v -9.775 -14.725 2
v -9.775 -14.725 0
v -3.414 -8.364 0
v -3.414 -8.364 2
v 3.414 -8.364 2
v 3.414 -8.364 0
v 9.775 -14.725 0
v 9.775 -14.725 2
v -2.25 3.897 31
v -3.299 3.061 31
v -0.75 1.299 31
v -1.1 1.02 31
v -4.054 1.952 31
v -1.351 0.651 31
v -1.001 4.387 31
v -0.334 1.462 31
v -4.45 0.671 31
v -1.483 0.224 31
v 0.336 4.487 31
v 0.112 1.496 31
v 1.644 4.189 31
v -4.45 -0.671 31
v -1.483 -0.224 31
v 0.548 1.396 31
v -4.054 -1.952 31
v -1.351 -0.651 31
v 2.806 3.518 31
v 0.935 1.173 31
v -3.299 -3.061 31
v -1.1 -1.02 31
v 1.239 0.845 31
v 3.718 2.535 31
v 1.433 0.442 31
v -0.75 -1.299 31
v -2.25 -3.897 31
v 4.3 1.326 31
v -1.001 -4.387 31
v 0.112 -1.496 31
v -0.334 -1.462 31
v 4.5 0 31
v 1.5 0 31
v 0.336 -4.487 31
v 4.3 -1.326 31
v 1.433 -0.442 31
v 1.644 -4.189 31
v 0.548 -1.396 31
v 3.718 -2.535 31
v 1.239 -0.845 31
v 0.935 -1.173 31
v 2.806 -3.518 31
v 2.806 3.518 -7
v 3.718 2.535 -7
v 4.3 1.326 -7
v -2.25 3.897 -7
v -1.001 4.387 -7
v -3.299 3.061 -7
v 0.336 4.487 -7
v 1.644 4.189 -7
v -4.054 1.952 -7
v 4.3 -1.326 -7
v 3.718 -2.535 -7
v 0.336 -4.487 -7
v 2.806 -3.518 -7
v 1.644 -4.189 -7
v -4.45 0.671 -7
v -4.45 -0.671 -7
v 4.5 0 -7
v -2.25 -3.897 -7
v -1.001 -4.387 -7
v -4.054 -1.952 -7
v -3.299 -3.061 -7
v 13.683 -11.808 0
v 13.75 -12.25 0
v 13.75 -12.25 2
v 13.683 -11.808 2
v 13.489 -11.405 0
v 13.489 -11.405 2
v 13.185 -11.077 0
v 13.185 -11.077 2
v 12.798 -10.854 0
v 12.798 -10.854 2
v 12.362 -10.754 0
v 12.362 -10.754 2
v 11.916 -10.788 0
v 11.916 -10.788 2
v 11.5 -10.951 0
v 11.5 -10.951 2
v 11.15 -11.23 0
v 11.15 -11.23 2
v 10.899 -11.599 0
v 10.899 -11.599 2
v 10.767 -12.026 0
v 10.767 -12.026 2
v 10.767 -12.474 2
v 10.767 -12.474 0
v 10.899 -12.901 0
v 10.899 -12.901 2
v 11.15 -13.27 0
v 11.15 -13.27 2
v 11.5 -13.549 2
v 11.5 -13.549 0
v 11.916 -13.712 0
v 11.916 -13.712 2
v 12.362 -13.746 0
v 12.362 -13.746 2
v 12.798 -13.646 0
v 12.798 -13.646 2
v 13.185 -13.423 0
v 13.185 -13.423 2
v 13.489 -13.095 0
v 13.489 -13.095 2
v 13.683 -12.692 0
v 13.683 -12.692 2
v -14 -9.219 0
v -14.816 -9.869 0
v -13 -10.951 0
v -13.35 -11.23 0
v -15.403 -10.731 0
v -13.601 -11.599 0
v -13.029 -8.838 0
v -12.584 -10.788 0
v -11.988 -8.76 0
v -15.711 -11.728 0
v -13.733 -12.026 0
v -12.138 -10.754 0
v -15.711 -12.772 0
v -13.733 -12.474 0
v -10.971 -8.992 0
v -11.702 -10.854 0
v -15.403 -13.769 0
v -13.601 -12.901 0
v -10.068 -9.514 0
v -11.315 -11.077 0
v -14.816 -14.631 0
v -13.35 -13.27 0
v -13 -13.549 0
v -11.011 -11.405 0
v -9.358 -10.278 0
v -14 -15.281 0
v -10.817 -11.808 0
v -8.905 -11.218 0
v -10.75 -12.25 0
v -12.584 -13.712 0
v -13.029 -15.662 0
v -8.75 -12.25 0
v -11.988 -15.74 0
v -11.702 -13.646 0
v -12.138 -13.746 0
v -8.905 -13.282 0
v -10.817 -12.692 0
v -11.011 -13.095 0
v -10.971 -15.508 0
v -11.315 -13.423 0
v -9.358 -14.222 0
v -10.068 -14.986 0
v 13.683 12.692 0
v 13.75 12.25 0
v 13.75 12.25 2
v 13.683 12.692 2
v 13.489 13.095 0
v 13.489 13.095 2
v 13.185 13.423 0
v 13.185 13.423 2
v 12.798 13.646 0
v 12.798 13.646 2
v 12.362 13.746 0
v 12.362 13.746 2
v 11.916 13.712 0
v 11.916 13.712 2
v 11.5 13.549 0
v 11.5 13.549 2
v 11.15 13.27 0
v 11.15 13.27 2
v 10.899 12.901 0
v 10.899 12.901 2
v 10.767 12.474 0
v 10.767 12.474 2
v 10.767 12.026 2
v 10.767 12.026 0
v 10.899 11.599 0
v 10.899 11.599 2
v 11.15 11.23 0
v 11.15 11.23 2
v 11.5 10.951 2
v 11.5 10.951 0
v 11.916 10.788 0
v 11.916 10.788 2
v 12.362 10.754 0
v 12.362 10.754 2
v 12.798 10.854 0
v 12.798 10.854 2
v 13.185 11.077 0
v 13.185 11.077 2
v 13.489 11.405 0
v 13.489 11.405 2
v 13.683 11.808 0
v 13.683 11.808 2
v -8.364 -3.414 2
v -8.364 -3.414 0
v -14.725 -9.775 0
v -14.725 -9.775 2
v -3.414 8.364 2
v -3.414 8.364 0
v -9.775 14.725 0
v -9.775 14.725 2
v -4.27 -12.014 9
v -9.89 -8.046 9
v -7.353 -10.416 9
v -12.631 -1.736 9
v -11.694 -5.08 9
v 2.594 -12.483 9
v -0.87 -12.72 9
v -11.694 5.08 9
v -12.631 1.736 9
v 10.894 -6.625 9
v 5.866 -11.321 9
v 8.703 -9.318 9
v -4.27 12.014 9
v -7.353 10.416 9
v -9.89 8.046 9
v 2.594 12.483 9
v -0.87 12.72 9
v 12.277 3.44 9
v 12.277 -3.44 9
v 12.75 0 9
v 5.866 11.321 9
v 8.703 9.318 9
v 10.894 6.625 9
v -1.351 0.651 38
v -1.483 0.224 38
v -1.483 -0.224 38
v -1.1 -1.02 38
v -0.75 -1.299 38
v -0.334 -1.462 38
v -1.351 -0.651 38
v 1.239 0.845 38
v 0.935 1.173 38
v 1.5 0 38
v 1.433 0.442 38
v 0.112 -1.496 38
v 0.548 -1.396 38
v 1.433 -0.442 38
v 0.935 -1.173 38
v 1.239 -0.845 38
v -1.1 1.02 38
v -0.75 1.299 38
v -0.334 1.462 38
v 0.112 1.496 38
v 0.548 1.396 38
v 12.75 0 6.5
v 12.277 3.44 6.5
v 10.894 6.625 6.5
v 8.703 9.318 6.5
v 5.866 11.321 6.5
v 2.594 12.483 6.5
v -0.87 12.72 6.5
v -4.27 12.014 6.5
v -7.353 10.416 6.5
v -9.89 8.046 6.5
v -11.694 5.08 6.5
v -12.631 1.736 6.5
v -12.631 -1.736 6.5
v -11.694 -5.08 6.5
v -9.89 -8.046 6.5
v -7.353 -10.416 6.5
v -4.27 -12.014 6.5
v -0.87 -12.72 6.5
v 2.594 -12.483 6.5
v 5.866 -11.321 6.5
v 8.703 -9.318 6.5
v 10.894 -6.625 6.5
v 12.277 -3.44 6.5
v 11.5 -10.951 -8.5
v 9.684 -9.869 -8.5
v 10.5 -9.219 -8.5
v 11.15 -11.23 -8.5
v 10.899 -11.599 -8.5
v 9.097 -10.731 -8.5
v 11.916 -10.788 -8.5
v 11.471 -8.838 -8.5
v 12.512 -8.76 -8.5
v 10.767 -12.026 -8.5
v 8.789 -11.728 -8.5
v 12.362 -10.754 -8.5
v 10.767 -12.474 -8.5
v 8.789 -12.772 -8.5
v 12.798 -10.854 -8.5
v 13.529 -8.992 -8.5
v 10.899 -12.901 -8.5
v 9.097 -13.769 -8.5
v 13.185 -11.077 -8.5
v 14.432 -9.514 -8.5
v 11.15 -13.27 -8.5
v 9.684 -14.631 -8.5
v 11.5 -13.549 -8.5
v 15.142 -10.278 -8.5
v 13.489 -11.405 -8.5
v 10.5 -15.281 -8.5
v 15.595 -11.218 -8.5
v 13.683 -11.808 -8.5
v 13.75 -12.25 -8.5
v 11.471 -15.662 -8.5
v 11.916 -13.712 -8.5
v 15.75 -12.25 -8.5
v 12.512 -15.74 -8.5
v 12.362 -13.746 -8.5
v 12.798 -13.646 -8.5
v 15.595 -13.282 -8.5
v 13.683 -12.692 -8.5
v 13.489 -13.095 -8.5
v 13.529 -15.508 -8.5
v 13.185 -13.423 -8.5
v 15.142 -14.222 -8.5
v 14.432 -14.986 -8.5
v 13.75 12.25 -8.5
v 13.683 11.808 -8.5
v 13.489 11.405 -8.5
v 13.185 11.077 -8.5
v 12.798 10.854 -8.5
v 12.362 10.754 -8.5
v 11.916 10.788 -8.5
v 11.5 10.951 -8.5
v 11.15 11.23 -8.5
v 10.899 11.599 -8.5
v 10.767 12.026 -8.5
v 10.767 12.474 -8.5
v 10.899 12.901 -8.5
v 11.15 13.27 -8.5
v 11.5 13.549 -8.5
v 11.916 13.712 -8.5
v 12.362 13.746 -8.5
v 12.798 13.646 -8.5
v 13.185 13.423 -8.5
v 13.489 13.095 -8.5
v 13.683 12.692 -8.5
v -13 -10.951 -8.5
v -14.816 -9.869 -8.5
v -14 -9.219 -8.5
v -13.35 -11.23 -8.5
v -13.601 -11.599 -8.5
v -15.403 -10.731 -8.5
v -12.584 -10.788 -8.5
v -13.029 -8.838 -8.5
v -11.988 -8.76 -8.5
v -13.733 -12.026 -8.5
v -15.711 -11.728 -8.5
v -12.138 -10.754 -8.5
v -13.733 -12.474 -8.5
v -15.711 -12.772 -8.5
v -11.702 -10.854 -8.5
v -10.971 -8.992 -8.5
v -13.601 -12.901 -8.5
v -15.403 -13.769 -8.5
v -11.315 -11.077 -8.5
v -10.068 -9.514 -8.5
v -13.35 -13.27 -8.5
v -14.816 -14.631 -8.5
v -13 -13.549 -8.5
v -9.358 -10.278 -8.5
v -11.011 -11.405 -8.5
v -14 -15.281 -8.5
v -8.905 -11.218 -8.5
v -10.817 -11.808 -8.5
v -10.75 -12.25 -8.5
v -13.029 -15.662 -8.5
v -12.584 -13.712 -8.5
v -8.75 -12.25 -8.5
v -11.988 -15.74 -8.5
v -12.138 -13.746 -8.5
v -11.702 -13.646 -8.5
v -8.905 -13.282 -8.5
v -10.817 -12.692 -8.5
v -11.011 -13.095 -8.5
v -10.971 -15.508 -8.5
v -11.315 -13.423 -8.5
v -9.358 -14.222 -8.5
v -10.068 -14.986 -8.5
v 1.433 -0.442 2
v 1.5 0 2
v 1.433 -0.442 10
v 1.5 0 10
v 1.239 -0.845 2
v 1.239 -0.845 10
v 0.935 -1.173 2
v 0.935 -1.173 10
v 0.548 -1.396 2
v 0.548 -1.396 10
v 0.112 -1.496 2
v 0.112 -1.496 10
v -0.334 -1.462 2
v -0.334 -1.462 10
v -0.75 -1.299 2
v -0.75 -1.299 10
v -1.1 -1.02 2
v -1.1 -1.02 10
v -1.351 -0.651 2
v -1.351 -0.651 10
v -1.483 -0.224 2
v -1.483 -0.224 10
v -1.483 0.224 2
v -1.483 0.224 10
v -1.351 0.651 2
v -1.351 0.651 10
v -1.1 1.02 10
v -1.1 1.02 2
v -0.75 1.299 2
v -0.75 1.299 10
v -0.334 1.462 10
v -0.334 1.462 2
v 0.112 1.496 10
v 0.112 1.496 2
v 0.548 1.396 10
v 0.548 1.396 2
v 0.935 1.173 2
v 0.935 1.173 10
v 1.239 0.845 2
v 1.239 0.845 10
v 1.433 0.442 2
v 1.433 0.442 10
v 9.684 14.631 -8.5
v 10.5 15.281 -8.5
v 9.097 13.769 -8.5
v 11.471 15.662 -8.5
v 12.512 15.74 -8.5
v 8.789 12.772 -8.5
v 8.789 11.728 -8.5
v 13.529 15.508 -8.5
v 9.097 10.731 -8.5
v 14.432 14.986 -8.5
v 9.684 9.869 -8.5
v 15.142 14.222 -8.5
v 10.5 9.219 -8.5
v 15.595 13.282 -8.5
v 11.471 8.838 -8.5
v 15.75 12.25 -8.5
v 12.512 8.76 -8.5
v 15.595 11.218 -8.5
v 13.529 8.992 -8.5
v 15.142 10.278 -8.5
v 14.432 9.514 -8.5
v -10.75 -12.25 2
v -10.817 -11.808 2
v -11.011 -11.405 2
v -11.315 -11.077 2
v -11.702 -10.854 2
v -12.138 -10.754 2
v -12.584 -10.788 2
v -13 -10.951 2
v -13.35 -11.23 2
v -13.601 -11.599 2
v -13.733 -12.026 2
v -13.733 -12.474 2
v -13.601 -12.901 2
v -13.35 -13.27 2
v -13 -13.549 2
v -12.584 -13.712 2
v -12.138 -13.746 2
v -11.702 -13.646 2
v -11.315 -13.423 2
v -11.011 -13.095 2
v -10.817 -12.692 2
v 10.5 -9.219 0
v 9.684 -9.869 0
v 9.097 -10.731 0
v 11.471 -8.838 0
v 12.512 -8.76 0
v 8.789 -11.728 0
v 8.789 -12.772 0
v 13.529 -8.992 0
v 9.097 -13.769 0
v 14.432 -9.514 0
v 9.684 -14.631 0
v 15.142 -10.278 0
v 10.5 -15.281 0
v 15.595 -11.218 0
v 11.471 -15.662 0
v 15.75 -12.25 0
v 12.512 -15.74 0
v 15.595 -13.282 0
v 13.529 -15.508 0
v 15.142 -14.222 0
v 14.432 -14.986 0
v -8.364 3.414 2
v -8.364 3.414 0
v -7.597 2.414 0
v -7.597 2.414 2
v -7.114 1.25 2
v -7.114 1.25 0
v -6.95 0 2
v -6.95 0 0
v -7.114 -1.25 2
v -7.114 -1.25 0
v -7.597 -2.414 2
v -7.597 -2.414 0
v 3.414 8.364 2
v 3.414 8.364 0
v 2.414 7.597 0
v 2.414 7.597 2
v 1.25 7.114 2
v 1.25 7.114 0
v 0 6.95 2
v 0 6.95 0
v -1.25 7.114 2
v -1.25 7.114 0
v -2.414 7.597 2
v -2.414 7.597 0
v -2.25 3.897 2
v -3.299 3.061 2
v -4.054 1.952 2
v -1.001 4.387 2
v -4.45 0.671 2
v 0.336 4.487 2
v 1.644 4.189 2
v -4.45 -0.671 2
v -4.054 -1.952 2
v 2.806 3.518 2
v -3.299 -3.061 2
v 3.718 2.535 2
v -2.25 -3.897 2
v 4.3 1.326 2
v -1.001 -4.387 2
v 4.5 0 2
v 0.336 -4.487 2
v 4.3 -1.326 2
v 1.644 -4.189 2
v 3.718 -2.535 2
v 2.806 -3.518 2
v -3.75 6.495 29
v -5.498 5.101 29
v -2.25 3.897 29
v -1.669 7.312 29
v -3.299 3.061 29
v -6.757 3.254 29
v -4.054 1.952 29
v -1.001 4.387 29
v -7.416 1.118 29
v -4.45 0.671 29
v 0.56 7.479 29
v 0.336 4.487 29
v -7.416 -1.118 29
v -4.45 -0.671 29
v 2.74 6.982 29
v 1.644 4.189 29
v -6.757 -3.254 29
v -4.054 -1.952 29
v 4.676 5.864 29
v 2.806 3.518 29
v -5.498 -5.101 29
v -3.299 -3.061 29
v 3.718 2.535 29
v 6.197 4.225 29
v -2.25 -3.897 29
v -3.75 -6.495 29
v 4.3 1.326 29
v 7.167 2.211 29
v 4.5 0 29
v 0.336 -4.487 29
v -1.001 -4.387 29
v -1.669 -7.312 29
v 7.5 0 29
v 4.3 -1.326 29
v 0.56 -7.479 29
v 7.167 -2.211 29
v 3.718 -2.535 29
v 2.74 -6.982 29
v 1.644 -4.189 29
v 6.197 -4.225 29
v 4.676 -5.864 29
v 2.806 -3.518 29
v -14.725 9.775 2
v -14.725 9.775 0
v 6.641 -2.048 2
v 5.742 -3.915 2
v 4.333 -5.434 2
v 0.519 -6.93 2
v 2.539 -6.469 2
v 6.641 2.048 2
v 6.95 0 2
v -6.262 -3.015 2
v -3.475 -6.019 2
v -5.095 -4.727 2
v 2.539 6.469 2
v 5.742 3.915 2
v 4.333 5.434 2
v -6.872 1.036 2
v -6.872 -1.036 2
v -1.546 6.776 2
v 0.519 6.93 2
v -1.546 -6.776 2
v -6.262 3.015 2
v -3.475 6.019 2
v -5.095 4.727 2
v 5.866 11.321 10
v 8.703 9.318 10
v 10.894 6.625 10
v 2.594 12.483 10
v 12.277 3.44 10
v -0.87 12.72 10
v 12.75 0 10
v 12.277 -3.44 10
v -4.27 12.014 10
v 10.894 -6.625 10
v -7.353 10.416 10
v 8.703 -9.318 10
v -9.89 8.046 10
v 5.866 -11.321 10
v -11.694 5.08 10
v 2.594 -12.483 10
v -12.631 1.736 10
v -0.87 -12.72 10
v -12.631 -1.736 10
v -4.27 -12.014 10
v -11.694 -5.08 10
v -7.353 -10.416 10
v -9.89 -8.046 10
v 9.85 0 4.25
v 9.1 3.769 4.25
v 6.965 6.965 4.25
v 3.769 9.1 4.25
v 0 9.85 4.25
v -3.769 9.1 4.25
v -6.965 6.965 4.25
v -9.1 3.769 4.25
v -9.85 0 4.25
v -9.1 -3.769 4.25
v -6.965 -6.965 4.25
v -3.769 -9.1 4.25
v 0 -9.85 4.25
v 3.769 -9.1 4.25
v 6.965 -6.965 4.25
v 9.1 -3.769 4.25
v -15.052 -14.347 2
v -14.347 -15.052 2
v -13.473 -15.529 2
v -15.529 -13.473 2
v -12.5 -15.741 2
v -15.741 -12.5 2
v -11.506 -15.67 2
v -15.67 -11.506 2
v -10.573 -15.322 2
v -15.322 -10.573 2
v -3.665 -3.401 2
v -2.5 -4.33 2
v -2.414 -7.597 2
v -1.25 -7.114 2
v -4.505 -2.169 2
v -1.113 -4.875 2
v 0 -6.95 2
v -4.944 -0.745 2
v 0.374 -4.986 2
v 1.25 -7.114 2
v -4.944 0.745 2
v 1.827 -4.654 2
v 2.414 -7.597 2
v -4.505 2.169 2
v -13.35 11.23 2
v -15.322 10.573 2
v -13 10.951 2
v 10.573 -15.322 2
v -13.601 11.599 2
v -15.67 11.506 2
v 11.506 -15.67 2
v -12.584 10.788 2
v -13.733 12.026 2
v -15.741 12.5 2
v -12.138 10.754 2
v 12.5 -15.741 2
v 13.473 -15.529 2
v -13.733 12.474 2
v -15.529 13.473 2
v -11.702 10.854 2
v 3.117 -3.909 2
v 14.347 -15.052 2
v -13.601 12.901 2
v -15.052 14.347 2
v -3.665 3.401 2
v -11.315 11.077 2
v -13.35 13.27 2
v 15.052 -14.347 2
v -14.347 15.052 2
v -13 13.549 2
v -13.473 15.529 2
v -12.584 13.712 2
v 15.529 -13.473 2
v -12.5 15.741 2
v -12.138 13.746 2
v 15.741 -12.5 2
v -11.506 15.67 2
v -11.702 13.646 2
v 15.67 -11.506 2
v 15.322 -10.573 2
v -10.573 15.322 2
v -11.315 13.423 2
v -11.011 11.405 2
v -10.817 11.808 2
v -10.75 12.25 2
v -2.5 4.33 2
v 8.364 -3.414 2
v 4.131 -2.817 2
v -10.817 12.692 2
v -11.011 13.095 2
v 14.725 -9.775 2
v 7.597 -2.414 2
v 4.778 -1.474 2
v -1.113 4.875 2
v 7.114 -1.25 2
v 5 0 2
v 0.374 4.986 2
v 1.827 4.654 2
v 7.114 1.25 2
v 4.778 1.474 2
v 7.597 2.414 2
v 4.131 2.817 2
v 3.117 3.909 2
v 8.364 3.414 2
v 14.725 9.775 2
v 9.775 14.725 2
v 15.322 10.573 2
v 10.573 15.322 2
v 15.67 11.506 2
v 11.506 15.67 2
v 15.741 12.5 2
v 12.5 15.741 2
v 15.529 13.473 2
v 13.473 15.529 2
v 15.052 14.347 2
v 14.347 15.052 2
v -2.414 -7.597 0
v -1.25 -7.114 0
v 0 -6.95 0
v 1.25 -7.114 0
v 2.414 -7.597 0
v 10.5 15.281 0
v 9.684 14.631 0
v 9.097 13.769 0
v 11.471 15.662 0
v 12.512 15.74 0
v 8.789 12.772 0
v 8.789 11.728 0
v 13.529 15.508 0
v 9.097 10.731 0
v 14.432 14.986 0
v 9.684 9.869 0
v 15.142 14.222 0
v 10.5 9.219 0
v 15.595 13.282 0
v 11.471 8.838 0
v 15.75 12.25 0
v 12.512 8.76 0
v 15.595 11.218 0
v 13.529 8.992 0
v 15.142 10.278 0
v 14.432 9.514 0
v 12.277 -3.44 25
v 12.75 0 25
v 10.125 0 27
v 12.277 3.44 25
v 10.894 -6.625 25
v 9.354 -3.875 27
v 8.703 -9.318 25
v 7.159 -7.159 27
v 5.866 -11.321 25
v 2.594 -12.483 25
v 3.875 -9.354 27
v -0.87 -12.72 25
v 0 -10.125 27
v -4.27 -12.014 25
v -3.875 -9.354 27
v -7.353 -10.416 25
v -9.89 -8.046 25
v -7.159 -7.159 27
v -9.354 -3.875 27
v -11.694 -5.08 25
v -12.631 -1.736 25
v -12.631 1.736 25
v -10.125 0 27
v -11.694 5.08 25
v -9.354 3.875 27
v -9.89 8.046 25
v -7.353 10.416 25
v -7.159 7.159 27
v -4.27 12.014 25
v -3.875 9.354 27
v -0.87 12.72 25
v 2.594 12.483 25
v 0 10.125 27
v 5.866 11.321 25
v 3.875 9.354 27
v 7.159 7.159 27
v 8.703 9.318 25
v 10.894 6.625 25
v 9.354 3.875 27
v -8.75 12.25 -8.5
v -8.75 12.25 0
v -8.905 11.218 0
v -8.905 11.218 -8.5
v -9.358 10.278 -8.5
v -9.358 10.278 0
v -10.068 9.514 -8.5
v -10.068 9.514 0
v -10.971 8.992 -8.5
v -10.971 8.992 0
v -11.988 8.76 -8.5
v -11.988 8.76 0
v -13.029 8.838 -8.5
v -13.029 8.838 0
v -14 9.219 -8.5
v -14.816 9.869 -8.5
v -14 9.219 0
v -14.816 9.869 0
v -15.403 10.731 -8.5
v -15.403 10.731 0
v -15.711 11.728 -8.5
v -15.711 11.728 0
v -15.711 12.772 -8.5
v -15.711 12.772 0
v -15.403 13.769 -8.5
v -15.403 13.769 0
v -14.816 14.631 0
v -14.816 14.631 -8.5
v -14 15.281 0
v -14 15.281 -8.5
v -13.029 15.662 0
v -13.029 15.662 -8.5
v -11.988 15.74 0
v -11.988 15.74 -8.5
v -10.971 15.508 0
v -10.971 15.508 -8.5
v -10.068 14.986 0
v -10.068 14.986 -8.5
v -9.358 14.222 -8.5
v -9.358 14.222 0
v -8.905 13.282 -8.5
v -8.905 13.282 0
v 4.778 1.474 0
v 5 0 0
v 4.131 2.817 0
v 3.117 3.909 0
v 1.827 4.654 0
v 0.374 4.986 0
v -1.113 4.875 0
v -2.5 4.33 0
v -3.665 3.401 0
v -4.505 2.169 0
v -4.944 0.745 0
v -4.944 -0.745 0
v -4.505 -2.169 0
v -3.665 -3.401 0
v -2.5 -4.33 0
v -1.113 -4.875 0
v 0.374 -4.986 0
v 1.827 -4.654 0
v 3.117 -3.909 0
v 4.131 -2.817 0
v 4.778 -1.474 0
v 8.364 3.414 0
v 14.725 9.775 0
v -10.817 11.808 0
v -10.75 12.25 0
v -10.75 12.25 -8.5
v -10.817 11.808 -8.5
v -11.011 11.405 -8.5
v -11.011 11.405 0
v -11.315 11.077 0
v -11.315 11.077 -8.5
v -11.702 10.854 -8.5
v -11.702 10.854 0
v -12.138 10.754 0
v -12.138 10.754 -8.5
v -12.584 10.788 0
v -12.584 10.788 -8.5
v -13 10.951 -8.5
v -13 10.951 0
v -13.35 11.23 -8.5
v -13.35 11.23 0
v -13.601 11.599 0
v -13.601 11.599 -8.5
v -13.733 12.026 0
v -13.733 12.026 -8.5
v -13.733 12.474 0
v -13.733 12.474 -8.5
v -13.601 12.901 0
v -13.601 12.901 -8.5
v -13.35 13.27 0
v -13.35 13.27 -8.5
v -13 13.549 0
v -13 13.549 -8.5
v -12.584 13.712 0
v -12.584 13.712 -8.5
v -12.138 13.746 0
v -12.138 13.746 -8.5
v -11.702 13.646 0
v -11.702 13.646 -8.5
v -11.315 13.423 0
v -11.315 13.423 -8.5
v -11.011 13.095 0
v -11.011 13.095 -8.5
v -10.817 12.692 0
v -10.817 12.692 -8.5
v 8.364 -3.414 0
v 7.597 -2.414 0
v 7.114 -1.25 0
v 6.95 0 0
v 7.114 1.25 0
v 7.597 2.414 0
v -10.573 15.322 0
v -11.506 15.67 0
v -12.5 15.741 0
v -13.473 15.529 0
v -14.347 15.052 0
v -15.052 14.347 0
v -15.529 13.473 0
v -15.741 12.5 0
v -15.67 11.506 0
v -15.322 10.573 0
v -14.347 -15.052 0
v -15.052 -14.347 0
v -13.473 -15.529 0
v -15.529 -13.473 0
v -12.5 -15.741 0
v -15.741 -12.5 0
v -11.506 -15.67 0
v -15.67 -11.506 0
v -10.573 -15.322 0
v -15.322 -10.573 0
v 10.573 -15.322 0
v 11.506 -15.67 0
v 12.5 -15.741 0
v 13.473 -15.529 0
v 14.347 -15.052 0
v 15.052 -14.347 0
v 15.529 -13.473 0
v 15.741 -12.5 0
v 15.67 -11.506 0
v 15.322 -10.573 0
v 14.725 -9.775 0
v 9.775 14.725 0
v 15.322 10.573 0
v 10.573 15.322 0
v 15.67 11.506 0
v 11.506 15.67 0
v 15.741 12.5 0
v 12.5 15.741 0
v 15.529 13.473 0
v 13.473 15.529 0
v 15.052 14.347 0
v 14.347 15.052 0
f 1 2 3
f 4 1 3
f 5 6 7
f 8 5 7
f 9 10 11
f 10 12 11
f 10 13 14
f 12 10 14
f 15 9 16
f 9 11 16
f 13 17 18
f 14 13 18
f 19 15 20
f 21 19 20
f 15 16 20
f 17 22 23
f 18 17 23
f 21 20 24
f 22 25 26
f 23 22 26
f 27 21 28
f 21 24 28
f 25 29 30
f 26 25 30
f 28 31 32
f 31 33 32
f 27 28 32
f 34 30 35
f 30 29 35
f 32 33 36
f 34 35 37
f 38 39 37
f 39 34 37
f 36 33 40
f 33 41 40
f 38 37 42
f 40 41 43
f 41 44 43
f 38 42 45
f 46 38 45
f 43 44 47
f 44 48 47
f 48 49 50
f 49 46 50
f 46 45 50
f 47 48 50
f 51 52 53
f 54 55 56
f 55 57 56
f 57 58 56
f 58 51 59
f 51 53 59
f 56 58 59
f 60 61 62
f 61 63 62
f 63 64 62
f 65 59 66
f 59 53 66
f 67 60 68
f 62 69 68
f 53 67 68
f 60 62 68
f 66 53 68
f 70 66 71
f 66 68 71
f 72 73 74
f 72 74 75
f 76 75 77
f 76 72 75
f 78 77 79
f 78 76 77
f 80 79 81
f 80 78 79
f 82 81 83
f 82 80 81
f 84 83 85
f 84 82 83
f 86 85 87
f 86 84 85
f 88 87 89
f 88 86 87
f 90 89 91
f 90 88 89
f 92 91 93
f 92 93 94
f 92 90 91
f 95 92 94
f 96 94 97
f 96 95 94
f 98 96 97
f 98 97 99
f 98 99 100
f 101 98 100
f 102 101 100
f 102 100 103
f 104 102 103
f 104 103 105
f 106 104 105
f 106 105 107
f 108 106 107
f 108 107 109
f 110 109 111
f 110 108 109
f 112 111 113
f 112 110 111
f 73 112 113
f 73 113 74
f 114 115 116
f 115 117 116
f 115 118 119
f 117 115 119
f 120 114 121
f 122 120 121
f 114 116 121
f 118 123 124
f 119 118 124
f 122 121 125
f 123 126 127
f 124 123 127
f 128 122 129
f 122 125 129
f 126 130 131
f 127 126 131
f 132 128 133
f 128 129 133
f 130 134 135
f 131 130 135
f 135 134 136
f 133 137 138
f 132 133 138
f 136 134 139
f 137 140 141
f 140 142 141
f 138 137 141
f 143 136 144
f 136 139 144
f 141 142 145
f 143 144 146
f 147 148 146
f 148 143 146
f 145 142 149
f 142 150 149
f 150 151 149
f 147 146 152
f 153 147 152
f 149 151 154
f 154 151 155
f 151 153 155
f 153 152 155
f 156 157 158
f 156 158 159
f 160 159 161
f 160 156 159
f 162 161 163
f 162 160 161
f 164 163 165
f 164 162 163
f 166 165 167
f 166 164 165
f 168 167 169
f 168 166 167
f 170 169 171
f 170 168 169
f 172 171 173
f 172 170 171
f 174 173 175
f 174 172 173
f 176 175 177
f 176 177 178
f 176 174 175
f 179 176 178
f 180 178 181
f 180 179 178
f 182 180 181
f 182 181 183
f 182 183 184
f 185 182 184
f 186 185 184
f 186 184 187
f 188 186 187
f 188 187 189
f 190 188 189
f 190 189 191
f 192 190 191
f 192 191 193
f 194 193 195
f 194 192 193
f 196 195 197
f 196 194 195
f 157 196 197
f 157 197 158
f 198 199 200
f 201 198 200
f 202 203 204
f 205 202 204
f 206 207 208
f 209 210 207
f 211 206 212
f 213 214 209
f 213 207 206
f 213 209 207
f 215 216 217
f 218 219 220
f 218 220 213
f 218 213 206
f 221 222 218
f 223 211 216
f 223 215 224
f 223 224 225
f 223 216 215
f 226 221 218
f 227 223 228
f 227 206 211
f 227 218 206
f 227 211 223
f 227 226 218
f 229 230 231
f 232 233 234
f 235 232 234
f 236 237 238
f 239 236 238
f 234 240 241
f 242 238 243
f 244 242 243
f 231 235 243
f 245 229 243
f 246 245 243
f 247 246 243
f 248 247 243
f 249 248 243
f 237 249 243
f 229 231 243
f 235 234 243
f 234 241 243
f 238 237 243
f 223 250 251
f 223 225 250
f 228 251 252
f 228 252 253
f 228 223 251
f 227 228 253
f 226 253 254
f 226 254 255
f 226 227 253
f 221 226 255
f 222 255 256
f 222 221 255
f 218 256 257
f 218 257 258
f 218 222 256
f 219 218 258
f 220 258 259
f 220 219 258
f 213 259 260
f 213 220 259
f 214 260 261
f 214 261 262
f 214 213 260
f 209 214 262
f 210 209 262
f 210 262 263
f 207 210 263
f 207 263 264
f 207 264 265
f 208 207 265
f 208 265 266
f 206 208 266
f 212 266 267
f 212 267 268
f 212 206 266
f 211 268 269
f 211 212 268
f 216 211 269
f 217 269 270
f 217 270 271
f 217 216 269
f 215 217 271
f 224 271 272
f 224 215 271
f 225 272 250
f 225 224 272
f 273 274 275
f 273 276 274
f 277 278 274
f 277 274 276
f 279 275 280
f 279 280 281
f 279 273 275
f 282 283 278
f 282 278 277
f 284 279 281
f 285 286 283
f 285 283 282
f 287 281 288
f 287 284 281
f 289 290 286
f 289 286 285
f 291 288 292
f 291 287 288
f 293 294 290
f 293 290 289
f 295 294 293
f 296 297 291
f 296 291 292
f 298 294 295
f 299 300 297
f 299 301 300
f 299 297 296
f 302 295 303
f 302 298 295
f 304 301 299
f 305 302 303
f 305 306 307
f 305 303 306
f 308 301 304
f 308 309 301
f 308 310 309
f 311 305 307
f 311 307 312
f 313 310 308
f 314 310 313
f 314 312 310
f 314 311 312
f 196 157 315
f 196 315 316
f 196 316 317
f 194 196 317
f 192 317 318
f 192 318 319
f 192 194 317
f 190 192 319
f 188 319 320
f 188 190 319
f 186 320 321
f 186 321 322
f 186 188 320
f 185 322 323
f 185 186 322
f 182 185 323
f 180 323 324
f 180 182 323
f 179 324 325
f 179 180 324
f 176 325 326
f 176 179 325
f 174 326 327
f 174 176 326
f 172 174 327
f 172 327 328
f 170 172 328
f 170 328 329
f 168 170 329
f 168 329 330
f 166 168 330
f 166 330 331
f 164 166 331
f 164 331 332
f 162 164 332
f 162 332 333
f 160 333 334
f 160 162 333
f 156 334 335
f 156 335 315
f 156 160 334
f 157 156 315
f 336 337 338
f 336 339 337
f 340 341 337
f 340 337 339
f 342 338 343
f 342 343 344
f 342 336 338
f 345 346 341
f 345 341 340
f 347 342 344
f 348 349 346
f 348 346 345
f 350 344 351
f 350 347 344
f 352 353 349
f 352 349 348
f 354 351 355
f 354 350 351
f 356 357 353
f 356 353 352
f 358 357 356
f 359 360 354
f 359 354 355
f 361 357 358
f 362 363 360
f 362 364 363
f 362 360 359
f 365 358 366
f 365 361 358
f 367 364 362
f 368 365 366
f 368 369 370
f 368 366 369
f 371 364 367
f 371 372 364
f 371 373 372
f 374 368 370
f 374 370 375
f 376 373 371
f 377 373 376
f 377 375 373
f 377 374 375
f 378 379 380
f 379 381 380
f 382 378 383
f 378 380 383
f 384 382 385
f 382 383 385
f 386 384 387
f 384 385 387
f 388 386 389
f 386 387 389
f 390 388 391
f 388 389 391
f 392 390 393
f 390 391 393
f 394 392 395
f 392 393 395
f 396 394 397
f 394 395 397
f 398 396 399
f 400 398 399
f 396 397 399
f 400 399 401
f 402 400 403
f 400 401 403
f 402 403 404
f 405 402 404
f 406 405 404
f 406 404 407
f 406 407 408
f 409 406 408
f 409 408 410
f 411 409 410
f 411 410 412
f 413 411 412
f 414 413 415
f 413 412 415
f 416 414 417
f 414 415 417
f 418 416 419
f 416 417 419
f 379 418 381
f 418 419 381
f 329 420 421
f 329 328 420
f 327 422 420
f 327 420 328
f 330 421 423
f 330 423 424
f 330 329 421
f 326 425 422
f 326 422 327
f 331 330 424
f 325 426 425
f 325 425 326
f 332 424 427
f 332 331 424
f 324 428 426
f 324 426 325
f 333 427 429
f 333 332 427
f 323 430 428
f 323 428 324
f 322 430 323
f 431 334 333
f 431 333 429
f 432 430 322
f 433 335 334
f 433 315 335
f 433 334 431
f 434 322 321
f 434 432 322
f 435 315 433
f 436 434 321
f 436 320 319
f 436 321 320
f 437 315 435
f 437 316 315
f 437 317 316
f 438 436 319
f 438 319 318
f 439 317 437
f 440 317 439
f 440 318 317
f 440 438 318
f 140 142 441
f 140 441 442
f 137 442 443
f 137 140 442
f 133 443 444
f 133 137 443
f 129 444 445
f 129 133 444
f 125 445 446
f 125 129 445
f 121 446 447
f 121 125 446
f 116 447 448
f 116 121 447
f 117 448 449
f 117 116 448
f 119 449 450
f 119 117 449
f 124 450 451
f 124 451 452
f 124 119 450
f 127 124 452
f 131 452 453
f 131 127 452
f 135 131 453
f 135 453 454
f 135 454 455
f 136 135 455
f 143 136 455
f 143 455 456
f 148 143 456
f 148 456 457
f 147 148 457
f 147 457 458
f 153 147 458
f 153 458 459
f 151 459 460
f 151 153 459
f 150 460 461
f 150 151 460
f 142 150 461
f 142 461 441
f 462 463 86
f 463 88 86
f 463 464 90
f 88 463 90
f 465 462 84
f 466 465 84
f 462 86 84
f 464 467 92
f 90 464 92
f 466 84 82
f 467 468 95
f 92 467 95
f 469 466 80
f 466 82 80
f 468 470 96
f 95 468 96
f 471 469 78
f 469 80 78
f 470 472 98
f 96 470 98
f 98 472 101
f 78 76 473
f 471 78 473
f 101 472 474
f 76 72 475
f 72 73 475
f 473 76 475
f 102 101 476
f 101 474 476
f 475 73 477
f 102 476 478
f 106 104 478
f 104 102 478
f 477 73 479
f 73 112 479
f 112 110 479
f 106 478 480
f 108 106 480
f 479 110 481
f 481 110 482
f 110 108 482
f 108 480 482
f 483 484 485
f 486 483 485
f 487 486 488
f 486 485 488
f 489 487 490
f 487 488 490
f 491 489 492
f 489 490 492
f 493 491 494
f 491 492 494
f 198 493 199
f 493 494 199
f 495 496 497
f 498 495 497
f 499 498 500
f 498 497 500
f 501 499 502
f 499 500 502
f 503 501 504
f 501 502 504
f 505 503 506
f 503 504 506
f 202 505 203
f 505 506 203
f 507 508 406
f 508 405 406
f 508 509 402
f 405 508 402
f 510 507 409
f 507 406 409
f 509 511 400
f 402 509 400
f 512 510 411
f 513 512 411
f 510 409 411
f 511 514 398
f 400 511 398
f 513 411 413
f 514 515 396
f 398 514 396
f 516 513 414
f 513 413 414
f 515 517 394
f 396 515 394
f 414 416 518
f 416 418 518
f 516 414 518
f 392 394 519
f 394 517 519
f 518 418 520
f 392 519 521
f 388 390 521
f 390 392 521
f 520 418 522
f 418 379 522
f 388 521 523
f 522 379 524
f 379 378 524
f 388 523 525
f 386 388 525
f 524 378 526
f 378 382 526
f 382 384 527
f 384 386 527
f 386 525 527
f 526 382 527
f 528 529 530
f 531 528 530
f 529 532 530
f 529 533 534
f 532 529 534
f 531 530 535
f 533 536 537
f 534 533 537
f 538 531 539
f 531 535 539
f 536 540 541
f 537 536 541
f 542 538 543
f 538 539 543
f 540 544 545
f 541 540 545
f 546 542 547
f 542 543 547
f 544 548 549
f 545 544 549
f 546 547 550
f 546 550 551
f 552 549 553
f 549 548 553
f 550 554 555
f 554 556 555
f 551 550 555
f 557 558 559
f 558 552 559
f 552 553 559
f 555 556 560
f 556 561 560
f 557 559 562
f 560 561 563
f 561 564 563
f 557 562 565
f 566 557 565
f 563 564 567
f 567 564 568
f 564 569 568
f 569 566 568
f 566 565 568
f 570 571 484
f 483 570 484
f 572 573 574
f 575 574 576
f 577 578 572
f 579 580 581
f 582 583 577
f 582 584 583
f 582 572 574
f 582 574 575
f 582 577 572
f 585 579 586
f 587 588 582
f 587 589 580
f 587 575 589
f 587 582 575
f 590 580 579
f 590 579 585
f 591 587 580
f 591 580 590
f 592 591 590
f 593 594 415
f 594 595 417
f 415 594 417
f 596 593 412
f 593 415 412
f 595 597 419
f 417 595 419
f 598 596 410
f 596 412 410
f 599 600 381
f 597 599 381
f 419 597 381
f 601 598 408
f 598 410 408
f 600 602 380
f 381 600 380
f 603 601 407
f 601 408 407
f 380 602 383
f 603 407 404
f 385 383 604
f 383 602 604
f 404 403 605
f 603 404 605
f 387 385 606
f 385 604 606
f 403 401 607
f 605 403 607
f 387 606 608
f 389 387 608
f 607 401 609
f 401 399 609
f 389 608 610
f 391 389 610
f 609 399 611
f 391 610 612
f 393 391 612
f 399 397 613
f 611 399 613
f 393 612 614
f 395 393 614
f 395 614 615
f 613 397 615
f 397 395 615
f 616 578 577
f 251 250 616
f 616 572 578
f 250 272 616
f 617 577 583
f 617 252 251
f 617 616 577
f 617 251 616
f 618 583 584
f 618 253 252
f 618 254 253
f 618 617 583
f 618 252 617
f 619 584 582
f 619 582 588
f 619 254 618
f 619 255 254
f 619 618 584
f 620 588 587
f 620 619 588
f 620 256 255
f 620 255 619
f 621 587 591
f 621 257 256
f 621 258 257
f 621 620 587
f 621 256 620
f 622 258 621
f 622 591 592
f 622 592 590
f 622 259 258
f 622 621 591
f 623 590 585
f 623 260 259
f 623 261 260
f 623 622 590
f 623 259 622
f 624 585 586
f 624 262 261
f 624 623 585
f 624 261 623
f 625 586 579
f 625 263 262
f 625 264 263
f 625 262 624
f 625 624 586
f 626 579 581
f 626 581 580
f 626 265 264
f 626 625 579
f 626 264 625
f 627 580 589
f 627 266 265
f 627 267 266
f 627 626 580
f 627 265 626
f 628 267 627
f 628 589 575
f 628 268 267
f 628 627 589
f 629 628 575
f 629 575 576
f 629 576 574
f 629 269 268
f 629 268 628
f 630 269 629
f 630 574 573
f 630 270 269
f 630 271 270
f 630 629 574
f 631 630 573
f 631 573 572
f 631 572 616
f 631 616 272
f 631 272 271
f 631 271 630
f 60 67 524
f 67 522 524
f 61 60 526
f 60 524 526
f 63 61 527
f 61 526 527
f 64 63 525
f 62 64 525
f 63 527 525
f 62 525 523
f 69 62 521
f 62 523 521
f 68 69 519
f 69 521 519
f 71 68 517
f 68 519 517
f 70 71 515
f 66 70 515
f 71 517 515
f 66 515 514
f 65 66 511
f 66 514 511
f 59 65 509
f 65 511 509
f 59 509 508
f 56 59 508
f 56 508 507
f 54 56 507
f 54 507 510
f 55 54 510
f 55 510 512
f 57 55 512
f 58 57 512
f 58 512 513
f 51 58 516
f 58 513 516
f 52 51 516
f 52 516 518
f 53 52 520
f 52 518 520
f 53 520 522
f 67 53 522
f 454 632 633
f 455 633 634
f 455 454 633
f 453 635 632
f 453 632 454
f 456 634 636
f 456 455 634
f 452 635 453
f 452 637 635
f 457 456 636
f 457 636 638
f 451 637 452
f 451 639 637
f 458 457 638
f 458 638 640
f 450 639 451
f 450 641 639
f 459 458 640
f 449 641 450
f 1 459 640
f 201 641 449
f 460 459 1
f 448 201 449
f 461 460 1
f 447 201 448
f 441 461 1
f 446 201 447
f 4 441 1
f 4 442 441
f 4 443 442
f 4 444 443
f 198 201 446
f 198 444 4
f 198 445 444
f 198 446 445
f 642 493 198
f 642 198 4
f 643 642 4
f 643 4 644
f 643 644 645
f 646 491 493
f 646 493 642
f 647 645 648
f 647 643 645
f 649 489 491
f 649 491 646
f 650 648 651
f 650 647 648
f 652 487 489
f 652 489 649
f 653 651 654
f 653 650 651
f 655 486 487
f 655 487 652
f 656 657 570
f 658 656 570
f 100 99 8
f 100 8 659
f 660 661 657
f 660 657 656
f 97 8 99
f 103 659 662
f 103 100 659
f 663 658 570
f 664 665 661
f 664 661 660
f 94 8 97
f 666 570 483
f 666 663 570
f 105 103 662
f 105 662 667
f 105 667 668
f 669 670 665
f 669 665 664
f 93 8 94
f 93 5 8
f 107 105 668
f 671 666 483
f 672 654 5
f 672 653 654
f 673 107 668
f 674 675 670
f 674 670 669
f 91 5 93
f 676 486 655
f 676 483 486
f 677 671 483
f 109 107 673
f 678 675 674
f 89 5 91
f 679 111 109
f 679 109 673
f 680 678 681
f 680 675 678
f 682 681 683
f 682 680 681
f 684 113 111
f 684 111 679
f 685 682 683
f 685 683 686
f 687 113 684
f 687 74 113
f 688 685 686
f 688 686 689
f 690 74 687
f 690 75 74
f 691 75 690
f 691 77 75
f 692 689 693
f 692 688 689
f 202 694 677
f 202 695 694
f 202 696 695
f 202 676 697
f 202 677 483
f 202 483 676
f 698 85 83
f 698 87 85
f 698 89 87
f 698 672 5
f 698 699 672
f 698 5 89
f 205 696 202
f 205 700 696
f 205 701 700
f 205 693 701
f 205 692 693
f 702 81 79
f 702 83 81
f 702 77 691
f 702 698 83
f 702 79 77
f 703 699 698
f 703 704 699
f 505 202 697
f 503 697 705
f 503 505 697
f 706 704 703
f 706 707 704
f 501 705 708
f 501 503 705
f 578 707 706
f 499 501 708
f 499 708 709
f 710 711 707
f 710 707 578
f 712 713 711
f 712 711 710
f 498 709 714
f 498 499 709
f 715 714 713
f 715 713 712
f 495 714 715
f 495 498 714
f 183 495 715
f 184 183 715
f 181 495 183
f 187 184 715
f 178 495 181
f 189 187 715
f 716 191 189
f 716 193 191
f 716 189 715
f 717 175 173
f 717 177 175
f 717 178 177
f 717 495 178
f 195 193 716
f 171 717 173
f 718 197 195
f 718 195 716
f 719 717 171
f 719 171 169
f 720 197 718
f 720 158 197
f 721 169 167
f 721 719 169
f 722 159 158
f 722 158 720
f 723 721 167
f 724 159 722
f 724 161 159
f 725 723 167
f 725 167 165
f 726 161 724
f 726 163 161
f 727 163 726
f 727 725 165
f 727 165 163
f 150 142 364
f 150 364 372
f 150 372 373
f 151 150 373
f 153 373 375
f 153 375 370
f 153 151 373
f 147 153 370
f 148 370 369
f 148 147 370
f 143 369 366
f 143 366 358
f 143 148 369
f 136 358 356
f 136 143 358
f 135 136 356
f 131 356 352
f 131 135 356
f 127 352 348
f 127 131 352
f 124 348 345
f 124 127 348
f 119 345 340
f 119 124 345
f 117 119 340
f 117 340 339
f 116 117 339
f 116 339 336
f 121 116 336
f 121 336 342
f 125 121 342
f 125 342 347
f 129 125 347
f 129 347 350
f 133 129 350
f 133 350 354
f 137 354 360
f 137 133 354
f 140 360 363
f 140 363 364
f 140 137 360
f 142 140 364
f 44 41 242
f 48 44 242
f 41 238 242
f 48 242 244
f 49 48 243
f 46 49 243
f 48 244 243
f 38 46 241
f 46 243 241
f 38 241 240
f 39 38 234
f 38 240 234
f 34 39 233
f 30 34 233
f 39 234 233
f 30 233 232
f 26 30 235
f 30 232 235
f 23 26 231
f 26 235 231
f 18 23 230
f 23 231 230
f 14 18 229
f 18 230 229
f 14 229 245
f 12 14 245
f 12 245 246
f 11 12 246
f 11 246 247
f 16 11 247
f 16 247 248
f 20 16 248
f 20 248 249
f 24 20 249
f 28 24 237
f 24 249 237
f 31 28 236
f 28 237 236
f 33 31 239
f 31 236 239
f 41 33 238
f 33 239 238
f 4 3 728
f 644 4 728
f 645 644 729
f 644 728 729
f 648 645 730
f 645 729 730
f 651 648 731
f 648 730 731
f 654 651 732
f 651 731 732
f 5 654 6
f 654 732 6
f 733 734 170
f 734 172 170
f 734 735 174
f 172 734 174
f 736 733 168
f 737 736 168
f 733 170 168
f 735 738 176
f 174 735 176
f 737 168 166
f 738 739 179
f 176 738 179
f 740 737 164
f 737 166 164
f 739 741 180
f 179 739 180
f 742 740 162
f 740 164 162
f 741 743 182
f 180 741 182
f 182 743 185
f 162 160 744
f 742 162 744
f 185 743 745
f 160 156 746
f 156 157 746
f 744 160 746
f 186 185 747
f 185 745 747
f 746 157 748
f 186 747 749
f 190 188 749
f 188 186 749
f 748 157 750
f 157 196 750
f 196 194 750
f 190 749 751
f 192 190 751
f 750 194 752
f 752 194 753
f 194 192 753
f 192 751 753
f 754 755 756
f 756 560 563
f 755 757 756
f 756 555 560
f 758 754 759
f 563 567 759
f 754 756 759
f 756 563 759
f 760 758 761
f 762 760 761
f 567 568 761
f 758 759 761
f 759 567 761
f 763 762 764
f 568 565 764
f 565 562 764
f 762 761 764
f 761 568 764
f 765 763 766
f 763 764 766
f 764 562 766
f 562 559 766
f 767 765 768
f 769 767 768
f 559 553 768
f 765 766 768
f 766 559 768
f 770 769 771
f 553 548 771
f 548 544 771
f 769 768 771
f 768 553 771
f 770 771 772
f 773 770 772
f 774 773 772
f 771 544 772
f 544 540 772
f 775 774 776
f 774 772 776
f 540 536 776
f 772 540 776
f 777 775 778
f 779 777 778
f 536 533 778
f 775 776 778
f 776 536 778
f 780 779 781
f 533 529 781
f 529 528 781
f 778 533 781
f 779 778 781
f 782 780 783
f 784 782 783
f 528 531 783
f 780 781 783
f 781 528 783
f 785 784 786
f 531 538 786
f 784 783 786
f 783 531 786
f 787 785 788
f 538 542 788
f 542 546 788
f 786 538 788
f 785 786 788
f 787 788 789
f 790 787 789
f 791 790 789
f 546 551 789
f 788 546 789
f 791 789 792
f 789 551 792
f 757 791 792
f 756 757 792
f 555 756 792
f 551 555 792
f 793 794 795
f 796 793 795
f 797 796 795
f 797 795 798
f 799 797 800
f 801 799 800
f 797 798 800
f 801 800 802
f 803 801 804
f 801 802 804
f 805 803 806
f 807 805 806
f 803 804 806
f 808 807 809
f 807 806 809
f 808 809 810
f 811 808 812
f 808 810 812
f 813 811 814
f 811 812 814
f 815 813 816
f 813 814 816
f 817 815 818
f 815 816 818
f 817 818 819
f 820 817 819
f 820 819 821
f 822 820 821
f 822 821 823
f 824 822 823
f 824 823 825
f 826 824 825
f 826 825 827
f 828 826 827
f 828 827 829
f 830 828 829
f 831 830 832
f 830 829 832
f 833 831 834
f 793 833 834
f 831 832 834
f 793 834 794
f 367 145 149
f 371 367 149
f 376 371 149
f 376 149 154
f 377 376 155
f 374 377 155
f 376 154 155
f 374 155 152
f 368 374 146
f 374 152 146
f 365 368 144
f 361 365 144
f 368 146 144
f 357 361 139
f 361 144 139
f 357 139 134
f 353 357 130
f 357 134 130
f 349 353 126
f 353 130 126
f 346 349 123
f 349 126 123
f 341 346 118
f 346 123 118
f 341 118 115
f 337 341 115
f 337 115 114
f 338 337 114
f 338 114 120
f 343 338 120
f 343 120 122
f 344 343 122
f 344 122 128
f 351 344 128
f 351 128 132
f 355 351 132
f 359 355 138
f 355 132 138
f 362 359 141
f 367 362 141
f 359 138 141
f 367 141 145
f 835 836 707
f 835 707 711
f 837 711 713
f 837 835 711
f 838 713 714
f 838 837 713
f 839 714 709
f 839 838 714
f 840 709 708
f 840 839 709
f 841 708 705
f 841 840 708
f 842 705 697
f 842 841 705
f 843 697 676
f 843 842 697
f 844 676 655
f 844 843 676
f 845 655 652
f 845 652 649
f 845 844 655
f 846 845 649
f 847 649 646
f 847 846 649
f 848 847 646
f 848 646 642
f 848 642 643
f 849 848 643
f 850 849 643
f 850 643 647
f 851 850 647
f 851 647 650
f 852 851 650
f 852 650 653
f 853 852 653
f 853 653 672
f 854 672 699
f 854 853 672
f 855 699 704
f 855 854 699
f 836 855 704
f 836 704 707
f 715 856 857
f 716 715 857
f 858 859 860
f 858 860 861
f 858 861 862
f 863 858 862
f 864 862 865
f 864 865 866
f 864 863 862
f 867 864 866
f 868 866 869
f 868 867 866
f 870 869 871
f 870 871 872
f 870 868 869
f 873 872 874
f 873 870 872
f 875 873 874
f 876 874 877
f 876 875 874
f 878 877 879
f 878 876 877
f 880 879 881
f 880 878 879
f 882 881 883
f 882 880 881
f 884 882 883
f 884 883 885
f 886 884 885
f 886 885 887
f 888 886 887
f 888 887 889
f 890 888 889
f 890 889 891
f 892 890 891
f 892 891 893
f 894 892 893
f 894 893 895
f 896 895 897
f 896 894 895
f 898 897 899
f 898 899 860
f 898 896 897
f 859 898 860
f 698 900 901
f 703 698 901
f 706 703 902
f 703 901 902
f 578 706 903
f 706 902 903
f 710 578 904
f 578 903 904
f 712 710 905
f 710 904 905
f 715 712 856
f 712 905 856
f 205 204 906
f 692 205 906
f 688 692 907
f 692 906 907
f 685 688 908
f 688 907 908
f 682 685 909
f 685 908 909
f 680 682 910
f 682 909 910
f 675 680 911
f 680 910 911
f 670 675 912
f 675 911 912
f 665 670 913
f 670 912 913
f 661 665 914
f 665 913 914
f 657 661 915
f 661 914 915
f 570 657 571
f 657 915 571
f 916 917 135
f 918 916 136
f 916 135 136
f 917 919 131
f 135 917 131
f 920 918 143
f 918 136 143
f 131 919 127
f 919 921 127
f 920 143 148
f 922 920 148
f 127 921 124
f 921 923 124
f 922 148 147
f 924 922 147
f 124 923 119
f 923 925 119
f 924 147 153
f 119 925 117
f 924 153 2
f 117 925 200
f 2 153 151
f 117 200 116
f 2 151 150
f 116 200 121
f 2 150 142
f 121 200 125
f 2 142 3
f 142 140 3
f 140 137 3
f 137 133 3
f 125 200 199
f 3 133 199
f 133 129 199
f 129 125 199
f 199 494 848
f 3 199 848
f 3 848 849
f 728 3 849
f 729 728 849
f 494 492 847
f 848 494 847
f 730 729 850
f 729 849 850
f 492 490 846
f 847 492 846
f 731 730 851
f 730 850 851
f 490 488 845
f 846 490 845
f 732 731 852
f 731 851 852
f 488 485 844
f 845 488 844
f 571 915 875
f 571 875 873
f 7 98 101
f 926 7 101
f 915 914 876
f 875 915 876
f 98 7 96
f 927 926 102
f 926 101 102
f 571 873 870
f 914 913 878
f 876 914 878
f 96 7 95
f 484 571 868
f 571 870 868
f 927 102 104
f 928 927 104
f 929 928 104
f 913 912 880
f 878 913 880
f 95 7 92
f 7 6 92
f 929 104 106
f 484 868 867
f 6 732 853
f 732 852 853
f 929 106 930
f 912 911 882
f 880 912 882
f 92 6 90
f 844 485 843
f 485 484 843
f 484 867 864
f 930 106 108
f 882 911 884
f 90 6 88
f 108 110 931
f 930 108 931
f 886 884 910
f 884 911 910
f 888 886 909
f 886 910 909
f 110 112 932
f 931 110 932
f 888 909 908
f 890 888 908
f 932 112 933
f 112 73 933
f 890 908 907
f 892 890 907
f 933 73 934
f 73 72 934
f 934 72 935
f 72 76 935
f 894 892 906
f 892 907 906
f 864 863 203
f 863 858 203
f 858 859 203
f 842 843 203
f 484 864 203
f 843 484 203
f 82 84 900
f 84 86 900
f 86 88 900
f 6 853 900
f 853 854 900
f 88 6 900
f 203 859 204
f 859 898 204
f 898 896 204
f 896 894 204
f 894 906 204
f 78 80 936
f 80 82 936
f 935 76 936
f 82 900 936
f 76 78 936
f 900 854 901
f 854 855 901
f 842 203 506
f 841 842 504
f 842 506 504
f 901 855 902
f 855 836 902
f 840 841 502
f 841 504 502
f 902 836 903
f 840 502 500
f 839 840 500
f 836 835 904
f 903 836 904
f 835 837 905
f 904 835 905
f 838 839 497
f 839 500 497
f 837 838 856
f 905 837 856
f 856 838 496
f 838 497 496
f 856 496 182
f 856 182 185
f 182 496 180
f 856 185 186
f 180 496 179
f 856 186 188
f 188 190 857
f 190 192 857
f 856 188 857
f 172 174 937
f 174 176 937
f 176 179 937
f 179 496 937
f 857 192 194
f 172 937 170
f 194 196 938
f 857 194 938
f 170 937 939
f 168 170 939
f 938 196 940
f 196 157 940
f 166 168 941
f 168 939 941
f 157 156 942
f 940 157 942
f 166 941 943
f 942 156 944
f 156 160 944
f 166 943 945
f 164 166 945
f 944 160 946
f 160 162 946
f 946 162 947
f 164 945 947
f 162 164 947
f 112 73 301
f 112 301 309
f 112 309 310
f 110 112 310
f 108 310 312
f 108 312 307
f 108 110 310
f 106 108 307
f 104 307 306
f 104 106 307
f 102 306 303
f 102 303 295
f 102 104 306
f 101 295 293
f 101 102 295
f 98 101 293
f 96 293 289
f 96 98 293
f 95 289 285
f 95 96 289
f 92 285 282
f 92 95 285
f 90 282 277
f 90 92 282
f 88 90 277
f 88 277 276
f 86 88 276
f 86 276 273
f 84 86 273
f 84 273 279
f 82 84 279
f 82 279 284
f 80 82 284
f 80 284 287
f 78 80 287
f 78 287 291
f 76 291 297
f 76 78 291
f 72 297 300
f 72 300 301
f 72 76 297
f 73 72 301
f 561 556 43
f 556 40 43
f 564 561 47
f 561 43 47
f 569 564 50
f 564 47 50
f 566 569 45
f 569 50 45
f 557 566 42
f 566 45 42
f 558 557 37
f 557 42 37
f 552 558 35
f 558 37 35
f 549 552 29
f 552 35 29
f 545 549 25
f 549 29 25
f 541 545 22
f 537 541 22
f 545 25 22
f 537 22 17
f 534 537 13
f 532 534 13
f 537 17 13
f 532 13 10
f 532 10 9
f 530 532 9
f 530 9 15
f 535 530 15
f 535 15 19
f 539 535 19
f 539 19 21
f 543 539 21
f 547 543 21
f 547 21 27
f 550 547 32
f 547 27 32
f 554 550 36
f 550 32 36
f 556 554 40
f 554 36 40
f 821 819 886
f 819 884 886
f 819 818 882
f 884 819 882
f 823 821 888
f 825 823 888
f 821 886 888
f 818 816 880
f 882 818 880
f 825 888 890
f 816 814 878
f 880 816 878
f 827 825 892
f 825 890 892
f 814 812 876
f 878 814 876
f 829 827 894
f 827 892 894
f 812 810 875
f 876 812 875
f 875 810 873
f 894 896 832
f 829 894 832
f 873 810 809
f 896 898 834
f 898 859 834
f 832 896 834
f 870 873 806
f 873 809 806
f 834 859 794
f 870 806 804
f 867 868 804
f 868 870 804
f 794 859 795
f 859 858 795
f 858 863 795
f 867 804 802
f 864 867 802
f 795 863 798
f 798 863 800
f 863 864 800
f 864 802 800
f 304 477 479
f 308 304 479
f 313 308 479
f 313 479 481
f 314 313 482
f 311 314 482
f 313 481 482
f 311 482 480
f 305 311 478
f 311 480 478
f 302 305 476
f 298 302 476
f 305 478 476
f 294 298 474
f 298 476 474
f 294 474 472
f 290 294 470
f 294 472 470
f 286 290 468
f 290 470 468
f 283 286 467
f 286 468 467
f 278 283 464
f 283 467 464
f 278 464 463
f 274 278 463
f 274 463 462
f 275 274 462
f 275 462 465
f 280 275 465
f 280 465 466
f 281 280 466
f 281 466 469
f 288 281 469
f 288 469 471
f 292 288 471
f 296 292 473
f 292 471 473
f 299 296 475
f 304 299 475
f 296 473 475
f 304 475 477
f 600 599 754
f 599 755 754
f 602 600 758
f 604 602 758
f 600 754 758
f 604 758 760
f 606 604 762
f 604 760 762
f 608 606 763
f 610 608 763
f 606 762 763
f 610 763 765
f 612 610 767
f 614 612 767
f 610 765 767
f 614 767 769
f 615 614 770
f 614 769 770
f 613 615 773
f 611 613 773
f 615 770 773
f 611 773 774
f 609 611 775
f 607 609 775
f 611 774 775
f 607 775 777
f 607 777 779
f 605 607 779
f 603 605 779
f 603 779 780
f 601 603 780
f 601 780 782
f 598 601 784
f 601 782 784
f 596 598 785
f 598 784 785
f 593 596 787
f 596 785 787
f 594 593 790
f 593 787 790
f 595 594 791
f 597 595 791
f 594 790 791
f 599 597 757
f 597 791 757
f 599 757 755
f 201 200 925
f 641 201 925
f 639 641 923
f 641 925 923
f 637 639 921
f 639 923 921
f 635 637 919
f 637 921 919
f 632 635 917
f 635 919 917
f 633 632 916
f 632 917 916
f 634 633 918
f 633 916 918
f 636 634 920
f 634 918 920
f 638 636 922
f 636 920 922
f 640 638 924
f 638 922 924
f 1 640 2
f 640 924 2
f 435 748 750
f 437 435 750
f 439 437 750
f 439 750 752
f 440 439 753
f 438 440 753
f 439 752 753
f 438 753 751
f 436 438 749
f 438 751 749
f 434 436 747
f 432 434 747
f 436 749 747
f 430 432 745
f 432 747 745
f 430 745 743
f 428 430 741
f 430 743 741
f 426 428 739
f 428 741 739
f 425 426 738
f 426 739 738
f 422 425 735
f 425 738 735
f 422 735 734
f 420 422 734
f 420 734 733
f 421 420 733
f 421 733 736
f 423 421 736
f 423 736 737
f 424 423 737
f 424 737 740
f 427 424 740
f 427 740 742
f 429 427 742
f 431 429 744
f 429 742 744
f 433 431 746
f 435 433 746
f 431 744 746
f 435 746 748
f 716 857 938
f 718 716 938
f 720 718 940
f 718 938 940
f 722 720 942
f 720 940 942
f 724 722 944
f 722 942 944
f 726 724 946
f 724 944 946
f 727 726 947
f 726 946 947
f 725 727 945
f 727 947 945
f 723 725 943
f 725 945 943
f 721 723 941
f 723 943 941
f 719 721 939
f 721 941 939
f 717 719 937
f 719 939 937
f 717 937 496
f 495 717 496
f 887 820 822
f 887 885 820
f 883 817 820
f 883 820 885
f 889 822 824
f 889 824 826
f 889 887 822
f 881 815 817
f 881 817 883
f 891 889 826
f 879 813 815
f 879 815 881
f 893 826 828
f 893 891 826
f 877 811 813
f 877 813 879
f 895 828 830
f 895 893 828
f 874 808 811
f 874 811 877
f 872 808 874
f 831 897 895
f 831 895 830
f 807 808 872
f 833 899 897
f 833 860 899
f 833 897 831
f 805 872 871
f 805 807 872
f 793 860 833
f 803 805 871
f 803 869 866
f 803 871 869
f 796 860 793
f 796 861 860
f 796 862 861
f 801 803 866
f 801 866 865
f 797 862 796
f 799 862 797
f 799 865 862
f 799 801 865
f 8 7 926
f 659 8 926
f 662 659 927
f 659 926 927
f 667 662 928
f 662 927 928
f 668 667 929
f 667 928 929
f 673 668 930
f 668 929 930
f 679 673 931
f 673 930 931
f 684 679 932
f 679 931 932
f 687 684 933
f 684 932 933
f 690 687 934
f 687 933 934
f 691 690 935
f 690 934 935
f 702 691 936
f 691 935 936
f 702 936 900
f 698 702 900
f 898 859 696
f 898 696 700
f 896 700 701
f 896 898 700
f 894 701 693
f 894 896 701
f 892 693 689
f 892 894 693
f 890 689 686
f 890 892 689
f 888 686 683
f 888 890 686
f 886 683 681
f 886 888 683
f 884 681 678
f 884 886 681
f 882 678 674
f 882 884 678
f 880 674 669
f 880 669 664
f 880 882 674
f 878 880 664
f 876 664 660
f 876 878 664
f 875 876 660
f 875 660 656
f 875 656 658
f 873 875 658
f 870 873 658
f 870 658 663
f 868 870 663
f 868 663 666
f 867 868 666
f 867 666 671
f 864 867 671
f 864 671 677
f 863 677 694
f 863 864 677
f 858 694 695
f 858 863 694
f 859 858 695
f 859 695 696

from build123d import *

# Parameters (mm, degrees)
F0_R     = 1.5
F0_R_2   = 5
F1_DEPTH = 2
F6_R     = 3.5
F6_R_2   = 1.5
F7_DEPTH = 8.5


with BuildPart() as f1:
    # F0 (on Top) → F1 (new body)
    with BuildSketch(Plane.XY):
        with BuildLine():
            Line((9.775126, 14.724874), (3.414214, 8.363961))
            ThreePointArc((3.414214, 8.363961), (0, 6.949747), (-3.414214, 8.363961))
            Line((-3.414214, 8.363961), (-9.775126, 14.724874))
            ThreePointArc((-9.775126, 14.724874), (-14.724874, 14.724874), (-14.724874, 9.775126))
            Line((-14.724874, 9.775126), (-8.363961, 3.414214))
            ThreePointArc((-8.363961, 3.414214), (-6.949747, 0), (-8.363961, -3.414214))
            Line((-8.363961, -3.414214), (-14.724874, -9.775126))
            ThreePointArc((-14.724874, -9.775126), (-14.724874, -14.724874), (-9.775126, -14.724874))
            Line((-9.775126, -14.724874), (-3.414214, -8.363961))
            ThreePointArc((-3.414214, -8.363961), (0, -6.949747), (3.414214, -8.363961))
            Line((3.414214, -8.363961), (9.775126, -14.724874))
            ThreePointArc((9.775126, -14.724874), (14.724874, -14.724874), (14.724874, -9.775126))
            Line((14.724874, -9.775126), (8.363961, -3.414214))
            ThreePointArc((8.363961, -3.414214), (6.949747, 0), (8.363961, 3.414214))
            Line((8.363961, 3.414214), (14.724874, 9.775126))
            ThreePointArc((14.724874, 9.775126), (14.724874, 14.724874), (9.775126, 14.724874))
        make_face()
        with Locations((-12.25, -12.25)):
            Circle(F0_R, mode=Mode.SUBTRACT)
        with Locations((12.25, -12.25)):
            Circle(F0_R, mode=Mode.SUBTRACT)
        with Locations((-12.25, 12.25)):
            Circle(F0_R, mode=Mode.SUBTRACT)
        Circle(F0_R_2, mode=Mode.SUBTRACT)
        with Locations((12.25, 12.25)):
            Circle(F0_R, mode=Mode.SUBTRACT)
    extrude(amount=F1_DEPTH)


with BuildPart() as f3:
    # F2 (on Front) → F3 (revolve)
    with BuildSketch(Plane.XZ):
        Polygon((12.75, 10), (12.75, 25), (7.5, 29), (4.5, 29), (4.5, 31), (1.5, 31), (1.5, 38), (0, 38), (0, -7), (4.5, -7), (4.5, 2), (1.5, 2), (1.5, 10), align=None)
    revolve(axis=Axis((0, 0, 15.5), (0, 0, -1)))


with BuildPart() as f5:
    # F4 (on Front) → F5 (revolve)
    with BuildSketch(Plane.XZ):
        Polygon((12.75, 9), (0, 9), (0, 2), (6.949747, 2), (12.75, 6.5), align=None)
    revolve(axis=Axis((0, 0, 5.5), (0, 0, 1)))


with BuildPart() as f7:
    # F6 (on face) → F7 (new body)
    with BuildSketch(Plane(origin=(0, 0, 0), x_dir=(1, 0, 0), z_dir=(0, 0, -1))):
        with Locations((12.25, 12.25)):
            Circle(F6_R)
        with Locations((12.25, 12.25)):
            Circle(F6_R_2, mode=Mode.SUBTRACT)
        with Locations((12.25, -12.25)):
            Circle(F6_R)
        with Locations((12.25, -12.25)):
            Circle(F6_R_2, mode=Mode.SUBTRACT)
        with Locations((-12.25, -12.25)):
            Circle(F6_R)
        with Locations((-12.25, -12.25)):
            Circle(F6_R_2, mode=Mode.SUBTRACT)
        with Locations((-12.25, 12.25)):
            Circle(F6_R)
        with Locations((-12.25, 12.25)):
            Circle(F6_R_2, mode=Mode.SUBTRACT)
    extrude(amount=F7_DEPTH)


solid = Compound([f1.part, f3.part, f5.part, f7.part])
